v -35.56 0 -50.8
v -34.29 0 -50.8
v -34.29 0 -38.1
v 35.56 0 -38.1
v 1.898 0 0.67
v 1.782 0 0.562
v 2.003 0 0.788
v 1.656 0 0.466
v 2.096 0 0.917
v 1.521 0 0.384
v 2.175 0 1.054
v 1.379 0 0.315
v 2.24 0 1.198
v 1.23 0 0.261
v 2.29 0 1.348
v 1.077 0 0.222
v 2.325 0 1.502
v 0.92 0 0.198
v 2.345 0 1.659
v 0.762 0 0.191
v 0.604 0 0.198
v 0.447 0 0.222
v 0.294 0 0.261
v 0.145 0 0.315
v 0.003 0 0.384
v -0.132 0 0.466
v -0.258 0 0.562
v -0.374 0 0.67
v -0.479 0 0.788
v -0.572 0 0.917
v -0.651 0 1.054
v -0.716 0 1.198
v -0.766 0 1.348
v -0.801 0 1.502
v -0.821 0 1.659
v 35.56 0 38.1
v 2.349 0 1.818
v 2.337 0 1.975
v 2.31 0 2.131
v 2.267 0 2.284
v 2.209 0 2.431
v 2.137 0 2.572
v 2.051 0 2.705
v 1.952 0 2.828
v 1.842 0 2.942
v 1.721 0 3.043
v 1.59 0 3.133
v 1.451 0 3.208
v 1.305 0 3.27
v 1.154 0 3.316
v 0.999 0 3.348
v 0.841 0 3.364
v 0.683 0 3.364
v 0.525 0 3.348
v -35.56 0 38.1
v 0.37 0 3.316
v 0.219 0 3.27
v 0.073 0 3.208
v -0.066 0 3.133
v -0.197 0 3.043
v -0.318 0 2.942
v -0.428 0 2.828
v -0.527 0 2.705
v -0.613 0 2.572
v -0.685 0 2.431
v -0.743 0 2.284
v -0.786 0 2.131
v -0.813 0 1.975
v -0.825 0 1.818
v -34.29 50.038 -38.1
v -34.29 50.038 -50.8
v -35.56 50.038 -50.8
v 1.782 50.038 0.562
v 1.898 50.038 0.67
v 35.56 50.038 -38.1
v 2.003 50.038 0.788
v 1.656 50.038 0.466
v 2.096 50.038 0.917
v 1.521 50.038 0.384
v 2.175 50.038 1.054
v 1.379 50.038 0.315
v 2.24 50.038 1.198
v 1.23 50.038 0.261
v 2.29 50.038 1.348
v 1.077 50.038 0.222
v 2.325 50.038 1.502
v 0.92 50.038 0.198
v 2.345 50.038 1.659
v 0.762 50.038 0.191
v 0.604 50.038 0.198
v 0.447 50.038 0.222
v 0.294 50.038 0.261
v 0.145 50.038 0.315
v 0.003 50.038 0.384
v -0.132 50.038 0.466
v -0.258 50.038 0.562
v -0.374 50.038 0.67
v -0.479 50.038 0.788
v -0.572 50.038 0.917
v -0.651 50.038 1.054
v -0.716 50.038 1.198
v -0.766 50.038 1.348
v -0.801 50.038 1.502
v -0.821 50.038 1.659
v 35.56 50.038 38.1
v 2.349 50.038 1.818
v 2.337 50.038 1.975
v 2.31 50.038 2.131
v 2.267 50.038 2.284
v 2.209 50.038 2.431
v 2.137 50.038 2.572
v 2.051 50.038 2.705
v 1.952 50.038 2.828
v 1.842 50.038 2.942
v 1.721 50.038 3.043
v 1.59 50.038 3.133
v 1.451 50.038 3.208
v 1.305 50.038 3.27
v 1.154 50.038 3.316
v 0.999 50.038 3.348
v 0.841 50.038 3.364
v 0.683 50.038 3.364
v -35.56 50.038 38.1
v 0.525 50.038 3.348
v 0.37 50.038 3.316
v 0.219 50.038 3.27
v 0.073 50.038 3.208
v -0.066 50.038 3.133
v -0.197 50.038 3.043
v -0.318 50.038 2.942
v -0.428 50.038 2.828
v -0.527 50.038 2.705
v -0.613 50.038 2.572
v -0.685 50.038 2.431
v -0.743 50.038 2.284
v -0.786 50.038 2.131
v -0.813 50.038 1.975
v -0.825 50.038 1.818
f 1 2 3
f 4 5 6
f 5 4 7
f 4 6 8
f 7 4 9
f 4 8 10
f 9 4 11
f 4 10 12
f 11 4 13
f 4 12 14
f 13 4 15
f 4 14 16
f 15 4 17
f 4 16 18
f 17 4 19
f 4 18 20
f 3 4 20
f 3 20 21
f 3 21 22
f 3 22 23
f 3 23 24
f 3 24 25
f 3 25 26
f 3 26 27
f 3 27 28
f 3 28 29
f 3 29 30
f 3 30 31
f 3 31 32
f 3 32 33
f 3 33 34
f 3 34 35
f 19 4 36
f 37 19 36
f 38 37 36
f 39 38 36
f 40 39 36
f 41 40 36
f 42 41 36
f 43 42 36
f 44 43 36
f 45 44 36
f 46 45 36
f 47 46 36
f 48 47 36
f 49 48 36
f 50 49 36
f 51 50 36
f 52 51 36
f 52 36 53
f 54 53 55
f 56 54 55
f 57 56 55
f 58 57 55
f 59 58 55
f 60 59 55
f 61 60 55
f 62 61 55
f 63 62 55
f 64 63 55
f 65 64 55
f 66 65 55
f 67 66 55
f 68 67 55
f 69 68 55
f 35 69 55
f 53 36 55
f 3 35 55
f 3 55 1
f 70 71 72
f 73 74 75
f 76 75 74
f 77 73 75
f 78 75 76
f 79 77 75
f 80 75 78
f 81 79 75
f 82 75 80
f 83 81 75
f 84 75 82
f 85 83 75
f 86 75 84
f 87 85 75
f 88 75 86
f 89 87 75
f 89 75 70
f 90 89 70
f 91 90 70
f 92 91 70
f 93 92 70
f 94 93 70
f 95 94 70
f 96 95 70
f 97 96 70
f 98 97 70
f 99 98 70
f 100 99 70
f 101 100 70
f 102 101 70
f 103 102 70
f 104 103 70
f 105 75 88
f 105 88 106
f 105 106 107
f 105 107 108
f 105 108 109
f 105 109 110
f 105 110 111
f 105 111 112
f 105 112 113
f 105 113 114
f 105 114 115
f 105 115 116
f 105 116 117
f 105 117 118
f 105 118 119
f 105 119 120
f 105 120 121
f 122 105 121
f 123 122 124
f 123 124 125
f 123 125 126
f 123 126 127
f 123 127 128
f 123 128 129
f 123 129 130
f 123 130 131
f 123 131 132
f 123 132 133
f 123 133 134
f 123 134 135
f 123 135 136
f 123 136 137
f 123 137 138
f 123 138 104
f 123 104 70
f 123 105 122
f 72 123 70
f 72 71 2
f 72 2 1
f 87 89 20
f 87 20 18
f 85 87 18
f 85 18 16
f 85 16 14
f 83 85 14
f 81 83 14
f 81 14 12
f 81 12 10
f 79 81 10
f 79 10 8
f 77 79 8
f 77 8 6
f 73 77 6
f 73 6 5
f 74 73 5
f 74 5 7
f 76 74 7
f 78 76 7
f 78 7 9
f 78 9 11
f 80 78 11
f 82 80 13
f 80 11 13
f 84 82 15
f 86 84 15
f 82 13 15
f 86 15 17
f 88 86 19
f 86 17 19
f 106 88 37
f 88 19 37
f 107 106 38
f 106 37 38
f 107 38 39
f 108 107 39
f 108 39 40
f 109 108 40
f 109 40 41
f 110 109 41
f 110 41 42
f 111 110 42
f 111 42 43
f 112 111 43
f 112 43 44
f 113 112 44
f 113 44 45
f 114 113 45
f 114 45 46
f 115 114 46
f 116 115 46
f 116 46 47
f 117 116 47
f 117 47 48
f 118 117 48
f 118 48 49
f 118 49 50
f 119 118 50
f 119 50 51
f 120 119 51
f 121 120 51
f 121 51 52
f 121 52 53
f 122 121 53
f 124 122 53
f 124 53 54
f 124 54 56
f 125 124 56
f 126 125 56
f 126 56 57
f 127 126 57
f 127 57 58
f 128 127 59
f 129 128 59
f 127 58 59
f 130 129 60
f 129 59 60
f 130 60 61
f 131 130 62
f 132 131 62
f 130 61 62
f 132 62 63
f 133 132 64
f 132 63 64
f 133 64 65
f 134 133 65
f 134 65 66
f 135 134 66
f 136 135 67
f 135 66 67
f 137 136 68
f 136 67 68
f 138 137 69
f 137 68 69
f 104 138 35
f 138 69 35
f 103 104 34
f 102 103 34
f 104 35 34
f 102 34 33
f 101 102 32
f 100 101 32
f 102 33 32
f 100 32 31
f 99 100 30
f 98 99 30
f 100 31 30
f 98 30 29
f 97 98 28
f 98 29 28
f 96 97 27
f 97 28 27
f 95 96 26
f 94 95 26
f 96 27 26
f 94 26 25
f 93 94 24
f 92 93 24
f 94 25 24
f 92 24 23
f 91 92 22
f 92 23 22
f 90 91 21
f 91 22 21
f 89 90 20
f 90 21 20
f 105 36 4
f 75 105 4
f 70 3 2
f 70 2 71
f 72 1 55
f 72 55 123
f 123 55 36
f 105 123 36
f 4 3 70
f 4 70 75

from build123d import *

# Parameters (mm, degrees)
SKETCH1_W           = 71.12
SKETCH1_H           = 76.2
BOSS_EXTRUDE1_DEPTH = 50.038
SKETCH2_W           = 1.27
SKETCH2_H           = 50.038
BOSS_EXTRUDE2_DEPTH = 12.7
SKETCH3_R           = 1.5875
CUT_EXTRUDE1_DEPTH  = 80.680330346


with BuildPart() as part:
    # Sketch1 → Boss-Extrude1 (new body)
    with BuildSketch(Plane(origin=(0, 0, 0), x_dir=(1, 0, 0), z_dir=(0, 1, 0))):
        Rectangle(SKETCH1_W, SKETCH1_H)
    extrude(amount=BOSS_EXTRUDE1_DEPTH)

    # Sketch2 → Boss-Extrude2 (add)
    with BuildSketch(Plane(origin=(0, 0, -38.1), x_dir=(-1, 0, 0), z_dir=(0, 0, -1))):
        with Locations((34.925, 25.019)):
            Rectangle(SKETCH2_W, SKETCH2_H)
    extrude(amount=BOSS_EXTRUDE2_DEPTH)

    # Sketch3 → Cut-Extrude1 (cut, through all)
    with BuildSketch(Plane.XZ):
        with Locations(Location((0.762, 1.778, 0), (0, 0, 270))):
            Circle(SKETCH3_R)
    extrude(amount=-CUT_EXTRUDE1_DEPTH, mode=Mode.SUBTRACT)


solid = part.part
